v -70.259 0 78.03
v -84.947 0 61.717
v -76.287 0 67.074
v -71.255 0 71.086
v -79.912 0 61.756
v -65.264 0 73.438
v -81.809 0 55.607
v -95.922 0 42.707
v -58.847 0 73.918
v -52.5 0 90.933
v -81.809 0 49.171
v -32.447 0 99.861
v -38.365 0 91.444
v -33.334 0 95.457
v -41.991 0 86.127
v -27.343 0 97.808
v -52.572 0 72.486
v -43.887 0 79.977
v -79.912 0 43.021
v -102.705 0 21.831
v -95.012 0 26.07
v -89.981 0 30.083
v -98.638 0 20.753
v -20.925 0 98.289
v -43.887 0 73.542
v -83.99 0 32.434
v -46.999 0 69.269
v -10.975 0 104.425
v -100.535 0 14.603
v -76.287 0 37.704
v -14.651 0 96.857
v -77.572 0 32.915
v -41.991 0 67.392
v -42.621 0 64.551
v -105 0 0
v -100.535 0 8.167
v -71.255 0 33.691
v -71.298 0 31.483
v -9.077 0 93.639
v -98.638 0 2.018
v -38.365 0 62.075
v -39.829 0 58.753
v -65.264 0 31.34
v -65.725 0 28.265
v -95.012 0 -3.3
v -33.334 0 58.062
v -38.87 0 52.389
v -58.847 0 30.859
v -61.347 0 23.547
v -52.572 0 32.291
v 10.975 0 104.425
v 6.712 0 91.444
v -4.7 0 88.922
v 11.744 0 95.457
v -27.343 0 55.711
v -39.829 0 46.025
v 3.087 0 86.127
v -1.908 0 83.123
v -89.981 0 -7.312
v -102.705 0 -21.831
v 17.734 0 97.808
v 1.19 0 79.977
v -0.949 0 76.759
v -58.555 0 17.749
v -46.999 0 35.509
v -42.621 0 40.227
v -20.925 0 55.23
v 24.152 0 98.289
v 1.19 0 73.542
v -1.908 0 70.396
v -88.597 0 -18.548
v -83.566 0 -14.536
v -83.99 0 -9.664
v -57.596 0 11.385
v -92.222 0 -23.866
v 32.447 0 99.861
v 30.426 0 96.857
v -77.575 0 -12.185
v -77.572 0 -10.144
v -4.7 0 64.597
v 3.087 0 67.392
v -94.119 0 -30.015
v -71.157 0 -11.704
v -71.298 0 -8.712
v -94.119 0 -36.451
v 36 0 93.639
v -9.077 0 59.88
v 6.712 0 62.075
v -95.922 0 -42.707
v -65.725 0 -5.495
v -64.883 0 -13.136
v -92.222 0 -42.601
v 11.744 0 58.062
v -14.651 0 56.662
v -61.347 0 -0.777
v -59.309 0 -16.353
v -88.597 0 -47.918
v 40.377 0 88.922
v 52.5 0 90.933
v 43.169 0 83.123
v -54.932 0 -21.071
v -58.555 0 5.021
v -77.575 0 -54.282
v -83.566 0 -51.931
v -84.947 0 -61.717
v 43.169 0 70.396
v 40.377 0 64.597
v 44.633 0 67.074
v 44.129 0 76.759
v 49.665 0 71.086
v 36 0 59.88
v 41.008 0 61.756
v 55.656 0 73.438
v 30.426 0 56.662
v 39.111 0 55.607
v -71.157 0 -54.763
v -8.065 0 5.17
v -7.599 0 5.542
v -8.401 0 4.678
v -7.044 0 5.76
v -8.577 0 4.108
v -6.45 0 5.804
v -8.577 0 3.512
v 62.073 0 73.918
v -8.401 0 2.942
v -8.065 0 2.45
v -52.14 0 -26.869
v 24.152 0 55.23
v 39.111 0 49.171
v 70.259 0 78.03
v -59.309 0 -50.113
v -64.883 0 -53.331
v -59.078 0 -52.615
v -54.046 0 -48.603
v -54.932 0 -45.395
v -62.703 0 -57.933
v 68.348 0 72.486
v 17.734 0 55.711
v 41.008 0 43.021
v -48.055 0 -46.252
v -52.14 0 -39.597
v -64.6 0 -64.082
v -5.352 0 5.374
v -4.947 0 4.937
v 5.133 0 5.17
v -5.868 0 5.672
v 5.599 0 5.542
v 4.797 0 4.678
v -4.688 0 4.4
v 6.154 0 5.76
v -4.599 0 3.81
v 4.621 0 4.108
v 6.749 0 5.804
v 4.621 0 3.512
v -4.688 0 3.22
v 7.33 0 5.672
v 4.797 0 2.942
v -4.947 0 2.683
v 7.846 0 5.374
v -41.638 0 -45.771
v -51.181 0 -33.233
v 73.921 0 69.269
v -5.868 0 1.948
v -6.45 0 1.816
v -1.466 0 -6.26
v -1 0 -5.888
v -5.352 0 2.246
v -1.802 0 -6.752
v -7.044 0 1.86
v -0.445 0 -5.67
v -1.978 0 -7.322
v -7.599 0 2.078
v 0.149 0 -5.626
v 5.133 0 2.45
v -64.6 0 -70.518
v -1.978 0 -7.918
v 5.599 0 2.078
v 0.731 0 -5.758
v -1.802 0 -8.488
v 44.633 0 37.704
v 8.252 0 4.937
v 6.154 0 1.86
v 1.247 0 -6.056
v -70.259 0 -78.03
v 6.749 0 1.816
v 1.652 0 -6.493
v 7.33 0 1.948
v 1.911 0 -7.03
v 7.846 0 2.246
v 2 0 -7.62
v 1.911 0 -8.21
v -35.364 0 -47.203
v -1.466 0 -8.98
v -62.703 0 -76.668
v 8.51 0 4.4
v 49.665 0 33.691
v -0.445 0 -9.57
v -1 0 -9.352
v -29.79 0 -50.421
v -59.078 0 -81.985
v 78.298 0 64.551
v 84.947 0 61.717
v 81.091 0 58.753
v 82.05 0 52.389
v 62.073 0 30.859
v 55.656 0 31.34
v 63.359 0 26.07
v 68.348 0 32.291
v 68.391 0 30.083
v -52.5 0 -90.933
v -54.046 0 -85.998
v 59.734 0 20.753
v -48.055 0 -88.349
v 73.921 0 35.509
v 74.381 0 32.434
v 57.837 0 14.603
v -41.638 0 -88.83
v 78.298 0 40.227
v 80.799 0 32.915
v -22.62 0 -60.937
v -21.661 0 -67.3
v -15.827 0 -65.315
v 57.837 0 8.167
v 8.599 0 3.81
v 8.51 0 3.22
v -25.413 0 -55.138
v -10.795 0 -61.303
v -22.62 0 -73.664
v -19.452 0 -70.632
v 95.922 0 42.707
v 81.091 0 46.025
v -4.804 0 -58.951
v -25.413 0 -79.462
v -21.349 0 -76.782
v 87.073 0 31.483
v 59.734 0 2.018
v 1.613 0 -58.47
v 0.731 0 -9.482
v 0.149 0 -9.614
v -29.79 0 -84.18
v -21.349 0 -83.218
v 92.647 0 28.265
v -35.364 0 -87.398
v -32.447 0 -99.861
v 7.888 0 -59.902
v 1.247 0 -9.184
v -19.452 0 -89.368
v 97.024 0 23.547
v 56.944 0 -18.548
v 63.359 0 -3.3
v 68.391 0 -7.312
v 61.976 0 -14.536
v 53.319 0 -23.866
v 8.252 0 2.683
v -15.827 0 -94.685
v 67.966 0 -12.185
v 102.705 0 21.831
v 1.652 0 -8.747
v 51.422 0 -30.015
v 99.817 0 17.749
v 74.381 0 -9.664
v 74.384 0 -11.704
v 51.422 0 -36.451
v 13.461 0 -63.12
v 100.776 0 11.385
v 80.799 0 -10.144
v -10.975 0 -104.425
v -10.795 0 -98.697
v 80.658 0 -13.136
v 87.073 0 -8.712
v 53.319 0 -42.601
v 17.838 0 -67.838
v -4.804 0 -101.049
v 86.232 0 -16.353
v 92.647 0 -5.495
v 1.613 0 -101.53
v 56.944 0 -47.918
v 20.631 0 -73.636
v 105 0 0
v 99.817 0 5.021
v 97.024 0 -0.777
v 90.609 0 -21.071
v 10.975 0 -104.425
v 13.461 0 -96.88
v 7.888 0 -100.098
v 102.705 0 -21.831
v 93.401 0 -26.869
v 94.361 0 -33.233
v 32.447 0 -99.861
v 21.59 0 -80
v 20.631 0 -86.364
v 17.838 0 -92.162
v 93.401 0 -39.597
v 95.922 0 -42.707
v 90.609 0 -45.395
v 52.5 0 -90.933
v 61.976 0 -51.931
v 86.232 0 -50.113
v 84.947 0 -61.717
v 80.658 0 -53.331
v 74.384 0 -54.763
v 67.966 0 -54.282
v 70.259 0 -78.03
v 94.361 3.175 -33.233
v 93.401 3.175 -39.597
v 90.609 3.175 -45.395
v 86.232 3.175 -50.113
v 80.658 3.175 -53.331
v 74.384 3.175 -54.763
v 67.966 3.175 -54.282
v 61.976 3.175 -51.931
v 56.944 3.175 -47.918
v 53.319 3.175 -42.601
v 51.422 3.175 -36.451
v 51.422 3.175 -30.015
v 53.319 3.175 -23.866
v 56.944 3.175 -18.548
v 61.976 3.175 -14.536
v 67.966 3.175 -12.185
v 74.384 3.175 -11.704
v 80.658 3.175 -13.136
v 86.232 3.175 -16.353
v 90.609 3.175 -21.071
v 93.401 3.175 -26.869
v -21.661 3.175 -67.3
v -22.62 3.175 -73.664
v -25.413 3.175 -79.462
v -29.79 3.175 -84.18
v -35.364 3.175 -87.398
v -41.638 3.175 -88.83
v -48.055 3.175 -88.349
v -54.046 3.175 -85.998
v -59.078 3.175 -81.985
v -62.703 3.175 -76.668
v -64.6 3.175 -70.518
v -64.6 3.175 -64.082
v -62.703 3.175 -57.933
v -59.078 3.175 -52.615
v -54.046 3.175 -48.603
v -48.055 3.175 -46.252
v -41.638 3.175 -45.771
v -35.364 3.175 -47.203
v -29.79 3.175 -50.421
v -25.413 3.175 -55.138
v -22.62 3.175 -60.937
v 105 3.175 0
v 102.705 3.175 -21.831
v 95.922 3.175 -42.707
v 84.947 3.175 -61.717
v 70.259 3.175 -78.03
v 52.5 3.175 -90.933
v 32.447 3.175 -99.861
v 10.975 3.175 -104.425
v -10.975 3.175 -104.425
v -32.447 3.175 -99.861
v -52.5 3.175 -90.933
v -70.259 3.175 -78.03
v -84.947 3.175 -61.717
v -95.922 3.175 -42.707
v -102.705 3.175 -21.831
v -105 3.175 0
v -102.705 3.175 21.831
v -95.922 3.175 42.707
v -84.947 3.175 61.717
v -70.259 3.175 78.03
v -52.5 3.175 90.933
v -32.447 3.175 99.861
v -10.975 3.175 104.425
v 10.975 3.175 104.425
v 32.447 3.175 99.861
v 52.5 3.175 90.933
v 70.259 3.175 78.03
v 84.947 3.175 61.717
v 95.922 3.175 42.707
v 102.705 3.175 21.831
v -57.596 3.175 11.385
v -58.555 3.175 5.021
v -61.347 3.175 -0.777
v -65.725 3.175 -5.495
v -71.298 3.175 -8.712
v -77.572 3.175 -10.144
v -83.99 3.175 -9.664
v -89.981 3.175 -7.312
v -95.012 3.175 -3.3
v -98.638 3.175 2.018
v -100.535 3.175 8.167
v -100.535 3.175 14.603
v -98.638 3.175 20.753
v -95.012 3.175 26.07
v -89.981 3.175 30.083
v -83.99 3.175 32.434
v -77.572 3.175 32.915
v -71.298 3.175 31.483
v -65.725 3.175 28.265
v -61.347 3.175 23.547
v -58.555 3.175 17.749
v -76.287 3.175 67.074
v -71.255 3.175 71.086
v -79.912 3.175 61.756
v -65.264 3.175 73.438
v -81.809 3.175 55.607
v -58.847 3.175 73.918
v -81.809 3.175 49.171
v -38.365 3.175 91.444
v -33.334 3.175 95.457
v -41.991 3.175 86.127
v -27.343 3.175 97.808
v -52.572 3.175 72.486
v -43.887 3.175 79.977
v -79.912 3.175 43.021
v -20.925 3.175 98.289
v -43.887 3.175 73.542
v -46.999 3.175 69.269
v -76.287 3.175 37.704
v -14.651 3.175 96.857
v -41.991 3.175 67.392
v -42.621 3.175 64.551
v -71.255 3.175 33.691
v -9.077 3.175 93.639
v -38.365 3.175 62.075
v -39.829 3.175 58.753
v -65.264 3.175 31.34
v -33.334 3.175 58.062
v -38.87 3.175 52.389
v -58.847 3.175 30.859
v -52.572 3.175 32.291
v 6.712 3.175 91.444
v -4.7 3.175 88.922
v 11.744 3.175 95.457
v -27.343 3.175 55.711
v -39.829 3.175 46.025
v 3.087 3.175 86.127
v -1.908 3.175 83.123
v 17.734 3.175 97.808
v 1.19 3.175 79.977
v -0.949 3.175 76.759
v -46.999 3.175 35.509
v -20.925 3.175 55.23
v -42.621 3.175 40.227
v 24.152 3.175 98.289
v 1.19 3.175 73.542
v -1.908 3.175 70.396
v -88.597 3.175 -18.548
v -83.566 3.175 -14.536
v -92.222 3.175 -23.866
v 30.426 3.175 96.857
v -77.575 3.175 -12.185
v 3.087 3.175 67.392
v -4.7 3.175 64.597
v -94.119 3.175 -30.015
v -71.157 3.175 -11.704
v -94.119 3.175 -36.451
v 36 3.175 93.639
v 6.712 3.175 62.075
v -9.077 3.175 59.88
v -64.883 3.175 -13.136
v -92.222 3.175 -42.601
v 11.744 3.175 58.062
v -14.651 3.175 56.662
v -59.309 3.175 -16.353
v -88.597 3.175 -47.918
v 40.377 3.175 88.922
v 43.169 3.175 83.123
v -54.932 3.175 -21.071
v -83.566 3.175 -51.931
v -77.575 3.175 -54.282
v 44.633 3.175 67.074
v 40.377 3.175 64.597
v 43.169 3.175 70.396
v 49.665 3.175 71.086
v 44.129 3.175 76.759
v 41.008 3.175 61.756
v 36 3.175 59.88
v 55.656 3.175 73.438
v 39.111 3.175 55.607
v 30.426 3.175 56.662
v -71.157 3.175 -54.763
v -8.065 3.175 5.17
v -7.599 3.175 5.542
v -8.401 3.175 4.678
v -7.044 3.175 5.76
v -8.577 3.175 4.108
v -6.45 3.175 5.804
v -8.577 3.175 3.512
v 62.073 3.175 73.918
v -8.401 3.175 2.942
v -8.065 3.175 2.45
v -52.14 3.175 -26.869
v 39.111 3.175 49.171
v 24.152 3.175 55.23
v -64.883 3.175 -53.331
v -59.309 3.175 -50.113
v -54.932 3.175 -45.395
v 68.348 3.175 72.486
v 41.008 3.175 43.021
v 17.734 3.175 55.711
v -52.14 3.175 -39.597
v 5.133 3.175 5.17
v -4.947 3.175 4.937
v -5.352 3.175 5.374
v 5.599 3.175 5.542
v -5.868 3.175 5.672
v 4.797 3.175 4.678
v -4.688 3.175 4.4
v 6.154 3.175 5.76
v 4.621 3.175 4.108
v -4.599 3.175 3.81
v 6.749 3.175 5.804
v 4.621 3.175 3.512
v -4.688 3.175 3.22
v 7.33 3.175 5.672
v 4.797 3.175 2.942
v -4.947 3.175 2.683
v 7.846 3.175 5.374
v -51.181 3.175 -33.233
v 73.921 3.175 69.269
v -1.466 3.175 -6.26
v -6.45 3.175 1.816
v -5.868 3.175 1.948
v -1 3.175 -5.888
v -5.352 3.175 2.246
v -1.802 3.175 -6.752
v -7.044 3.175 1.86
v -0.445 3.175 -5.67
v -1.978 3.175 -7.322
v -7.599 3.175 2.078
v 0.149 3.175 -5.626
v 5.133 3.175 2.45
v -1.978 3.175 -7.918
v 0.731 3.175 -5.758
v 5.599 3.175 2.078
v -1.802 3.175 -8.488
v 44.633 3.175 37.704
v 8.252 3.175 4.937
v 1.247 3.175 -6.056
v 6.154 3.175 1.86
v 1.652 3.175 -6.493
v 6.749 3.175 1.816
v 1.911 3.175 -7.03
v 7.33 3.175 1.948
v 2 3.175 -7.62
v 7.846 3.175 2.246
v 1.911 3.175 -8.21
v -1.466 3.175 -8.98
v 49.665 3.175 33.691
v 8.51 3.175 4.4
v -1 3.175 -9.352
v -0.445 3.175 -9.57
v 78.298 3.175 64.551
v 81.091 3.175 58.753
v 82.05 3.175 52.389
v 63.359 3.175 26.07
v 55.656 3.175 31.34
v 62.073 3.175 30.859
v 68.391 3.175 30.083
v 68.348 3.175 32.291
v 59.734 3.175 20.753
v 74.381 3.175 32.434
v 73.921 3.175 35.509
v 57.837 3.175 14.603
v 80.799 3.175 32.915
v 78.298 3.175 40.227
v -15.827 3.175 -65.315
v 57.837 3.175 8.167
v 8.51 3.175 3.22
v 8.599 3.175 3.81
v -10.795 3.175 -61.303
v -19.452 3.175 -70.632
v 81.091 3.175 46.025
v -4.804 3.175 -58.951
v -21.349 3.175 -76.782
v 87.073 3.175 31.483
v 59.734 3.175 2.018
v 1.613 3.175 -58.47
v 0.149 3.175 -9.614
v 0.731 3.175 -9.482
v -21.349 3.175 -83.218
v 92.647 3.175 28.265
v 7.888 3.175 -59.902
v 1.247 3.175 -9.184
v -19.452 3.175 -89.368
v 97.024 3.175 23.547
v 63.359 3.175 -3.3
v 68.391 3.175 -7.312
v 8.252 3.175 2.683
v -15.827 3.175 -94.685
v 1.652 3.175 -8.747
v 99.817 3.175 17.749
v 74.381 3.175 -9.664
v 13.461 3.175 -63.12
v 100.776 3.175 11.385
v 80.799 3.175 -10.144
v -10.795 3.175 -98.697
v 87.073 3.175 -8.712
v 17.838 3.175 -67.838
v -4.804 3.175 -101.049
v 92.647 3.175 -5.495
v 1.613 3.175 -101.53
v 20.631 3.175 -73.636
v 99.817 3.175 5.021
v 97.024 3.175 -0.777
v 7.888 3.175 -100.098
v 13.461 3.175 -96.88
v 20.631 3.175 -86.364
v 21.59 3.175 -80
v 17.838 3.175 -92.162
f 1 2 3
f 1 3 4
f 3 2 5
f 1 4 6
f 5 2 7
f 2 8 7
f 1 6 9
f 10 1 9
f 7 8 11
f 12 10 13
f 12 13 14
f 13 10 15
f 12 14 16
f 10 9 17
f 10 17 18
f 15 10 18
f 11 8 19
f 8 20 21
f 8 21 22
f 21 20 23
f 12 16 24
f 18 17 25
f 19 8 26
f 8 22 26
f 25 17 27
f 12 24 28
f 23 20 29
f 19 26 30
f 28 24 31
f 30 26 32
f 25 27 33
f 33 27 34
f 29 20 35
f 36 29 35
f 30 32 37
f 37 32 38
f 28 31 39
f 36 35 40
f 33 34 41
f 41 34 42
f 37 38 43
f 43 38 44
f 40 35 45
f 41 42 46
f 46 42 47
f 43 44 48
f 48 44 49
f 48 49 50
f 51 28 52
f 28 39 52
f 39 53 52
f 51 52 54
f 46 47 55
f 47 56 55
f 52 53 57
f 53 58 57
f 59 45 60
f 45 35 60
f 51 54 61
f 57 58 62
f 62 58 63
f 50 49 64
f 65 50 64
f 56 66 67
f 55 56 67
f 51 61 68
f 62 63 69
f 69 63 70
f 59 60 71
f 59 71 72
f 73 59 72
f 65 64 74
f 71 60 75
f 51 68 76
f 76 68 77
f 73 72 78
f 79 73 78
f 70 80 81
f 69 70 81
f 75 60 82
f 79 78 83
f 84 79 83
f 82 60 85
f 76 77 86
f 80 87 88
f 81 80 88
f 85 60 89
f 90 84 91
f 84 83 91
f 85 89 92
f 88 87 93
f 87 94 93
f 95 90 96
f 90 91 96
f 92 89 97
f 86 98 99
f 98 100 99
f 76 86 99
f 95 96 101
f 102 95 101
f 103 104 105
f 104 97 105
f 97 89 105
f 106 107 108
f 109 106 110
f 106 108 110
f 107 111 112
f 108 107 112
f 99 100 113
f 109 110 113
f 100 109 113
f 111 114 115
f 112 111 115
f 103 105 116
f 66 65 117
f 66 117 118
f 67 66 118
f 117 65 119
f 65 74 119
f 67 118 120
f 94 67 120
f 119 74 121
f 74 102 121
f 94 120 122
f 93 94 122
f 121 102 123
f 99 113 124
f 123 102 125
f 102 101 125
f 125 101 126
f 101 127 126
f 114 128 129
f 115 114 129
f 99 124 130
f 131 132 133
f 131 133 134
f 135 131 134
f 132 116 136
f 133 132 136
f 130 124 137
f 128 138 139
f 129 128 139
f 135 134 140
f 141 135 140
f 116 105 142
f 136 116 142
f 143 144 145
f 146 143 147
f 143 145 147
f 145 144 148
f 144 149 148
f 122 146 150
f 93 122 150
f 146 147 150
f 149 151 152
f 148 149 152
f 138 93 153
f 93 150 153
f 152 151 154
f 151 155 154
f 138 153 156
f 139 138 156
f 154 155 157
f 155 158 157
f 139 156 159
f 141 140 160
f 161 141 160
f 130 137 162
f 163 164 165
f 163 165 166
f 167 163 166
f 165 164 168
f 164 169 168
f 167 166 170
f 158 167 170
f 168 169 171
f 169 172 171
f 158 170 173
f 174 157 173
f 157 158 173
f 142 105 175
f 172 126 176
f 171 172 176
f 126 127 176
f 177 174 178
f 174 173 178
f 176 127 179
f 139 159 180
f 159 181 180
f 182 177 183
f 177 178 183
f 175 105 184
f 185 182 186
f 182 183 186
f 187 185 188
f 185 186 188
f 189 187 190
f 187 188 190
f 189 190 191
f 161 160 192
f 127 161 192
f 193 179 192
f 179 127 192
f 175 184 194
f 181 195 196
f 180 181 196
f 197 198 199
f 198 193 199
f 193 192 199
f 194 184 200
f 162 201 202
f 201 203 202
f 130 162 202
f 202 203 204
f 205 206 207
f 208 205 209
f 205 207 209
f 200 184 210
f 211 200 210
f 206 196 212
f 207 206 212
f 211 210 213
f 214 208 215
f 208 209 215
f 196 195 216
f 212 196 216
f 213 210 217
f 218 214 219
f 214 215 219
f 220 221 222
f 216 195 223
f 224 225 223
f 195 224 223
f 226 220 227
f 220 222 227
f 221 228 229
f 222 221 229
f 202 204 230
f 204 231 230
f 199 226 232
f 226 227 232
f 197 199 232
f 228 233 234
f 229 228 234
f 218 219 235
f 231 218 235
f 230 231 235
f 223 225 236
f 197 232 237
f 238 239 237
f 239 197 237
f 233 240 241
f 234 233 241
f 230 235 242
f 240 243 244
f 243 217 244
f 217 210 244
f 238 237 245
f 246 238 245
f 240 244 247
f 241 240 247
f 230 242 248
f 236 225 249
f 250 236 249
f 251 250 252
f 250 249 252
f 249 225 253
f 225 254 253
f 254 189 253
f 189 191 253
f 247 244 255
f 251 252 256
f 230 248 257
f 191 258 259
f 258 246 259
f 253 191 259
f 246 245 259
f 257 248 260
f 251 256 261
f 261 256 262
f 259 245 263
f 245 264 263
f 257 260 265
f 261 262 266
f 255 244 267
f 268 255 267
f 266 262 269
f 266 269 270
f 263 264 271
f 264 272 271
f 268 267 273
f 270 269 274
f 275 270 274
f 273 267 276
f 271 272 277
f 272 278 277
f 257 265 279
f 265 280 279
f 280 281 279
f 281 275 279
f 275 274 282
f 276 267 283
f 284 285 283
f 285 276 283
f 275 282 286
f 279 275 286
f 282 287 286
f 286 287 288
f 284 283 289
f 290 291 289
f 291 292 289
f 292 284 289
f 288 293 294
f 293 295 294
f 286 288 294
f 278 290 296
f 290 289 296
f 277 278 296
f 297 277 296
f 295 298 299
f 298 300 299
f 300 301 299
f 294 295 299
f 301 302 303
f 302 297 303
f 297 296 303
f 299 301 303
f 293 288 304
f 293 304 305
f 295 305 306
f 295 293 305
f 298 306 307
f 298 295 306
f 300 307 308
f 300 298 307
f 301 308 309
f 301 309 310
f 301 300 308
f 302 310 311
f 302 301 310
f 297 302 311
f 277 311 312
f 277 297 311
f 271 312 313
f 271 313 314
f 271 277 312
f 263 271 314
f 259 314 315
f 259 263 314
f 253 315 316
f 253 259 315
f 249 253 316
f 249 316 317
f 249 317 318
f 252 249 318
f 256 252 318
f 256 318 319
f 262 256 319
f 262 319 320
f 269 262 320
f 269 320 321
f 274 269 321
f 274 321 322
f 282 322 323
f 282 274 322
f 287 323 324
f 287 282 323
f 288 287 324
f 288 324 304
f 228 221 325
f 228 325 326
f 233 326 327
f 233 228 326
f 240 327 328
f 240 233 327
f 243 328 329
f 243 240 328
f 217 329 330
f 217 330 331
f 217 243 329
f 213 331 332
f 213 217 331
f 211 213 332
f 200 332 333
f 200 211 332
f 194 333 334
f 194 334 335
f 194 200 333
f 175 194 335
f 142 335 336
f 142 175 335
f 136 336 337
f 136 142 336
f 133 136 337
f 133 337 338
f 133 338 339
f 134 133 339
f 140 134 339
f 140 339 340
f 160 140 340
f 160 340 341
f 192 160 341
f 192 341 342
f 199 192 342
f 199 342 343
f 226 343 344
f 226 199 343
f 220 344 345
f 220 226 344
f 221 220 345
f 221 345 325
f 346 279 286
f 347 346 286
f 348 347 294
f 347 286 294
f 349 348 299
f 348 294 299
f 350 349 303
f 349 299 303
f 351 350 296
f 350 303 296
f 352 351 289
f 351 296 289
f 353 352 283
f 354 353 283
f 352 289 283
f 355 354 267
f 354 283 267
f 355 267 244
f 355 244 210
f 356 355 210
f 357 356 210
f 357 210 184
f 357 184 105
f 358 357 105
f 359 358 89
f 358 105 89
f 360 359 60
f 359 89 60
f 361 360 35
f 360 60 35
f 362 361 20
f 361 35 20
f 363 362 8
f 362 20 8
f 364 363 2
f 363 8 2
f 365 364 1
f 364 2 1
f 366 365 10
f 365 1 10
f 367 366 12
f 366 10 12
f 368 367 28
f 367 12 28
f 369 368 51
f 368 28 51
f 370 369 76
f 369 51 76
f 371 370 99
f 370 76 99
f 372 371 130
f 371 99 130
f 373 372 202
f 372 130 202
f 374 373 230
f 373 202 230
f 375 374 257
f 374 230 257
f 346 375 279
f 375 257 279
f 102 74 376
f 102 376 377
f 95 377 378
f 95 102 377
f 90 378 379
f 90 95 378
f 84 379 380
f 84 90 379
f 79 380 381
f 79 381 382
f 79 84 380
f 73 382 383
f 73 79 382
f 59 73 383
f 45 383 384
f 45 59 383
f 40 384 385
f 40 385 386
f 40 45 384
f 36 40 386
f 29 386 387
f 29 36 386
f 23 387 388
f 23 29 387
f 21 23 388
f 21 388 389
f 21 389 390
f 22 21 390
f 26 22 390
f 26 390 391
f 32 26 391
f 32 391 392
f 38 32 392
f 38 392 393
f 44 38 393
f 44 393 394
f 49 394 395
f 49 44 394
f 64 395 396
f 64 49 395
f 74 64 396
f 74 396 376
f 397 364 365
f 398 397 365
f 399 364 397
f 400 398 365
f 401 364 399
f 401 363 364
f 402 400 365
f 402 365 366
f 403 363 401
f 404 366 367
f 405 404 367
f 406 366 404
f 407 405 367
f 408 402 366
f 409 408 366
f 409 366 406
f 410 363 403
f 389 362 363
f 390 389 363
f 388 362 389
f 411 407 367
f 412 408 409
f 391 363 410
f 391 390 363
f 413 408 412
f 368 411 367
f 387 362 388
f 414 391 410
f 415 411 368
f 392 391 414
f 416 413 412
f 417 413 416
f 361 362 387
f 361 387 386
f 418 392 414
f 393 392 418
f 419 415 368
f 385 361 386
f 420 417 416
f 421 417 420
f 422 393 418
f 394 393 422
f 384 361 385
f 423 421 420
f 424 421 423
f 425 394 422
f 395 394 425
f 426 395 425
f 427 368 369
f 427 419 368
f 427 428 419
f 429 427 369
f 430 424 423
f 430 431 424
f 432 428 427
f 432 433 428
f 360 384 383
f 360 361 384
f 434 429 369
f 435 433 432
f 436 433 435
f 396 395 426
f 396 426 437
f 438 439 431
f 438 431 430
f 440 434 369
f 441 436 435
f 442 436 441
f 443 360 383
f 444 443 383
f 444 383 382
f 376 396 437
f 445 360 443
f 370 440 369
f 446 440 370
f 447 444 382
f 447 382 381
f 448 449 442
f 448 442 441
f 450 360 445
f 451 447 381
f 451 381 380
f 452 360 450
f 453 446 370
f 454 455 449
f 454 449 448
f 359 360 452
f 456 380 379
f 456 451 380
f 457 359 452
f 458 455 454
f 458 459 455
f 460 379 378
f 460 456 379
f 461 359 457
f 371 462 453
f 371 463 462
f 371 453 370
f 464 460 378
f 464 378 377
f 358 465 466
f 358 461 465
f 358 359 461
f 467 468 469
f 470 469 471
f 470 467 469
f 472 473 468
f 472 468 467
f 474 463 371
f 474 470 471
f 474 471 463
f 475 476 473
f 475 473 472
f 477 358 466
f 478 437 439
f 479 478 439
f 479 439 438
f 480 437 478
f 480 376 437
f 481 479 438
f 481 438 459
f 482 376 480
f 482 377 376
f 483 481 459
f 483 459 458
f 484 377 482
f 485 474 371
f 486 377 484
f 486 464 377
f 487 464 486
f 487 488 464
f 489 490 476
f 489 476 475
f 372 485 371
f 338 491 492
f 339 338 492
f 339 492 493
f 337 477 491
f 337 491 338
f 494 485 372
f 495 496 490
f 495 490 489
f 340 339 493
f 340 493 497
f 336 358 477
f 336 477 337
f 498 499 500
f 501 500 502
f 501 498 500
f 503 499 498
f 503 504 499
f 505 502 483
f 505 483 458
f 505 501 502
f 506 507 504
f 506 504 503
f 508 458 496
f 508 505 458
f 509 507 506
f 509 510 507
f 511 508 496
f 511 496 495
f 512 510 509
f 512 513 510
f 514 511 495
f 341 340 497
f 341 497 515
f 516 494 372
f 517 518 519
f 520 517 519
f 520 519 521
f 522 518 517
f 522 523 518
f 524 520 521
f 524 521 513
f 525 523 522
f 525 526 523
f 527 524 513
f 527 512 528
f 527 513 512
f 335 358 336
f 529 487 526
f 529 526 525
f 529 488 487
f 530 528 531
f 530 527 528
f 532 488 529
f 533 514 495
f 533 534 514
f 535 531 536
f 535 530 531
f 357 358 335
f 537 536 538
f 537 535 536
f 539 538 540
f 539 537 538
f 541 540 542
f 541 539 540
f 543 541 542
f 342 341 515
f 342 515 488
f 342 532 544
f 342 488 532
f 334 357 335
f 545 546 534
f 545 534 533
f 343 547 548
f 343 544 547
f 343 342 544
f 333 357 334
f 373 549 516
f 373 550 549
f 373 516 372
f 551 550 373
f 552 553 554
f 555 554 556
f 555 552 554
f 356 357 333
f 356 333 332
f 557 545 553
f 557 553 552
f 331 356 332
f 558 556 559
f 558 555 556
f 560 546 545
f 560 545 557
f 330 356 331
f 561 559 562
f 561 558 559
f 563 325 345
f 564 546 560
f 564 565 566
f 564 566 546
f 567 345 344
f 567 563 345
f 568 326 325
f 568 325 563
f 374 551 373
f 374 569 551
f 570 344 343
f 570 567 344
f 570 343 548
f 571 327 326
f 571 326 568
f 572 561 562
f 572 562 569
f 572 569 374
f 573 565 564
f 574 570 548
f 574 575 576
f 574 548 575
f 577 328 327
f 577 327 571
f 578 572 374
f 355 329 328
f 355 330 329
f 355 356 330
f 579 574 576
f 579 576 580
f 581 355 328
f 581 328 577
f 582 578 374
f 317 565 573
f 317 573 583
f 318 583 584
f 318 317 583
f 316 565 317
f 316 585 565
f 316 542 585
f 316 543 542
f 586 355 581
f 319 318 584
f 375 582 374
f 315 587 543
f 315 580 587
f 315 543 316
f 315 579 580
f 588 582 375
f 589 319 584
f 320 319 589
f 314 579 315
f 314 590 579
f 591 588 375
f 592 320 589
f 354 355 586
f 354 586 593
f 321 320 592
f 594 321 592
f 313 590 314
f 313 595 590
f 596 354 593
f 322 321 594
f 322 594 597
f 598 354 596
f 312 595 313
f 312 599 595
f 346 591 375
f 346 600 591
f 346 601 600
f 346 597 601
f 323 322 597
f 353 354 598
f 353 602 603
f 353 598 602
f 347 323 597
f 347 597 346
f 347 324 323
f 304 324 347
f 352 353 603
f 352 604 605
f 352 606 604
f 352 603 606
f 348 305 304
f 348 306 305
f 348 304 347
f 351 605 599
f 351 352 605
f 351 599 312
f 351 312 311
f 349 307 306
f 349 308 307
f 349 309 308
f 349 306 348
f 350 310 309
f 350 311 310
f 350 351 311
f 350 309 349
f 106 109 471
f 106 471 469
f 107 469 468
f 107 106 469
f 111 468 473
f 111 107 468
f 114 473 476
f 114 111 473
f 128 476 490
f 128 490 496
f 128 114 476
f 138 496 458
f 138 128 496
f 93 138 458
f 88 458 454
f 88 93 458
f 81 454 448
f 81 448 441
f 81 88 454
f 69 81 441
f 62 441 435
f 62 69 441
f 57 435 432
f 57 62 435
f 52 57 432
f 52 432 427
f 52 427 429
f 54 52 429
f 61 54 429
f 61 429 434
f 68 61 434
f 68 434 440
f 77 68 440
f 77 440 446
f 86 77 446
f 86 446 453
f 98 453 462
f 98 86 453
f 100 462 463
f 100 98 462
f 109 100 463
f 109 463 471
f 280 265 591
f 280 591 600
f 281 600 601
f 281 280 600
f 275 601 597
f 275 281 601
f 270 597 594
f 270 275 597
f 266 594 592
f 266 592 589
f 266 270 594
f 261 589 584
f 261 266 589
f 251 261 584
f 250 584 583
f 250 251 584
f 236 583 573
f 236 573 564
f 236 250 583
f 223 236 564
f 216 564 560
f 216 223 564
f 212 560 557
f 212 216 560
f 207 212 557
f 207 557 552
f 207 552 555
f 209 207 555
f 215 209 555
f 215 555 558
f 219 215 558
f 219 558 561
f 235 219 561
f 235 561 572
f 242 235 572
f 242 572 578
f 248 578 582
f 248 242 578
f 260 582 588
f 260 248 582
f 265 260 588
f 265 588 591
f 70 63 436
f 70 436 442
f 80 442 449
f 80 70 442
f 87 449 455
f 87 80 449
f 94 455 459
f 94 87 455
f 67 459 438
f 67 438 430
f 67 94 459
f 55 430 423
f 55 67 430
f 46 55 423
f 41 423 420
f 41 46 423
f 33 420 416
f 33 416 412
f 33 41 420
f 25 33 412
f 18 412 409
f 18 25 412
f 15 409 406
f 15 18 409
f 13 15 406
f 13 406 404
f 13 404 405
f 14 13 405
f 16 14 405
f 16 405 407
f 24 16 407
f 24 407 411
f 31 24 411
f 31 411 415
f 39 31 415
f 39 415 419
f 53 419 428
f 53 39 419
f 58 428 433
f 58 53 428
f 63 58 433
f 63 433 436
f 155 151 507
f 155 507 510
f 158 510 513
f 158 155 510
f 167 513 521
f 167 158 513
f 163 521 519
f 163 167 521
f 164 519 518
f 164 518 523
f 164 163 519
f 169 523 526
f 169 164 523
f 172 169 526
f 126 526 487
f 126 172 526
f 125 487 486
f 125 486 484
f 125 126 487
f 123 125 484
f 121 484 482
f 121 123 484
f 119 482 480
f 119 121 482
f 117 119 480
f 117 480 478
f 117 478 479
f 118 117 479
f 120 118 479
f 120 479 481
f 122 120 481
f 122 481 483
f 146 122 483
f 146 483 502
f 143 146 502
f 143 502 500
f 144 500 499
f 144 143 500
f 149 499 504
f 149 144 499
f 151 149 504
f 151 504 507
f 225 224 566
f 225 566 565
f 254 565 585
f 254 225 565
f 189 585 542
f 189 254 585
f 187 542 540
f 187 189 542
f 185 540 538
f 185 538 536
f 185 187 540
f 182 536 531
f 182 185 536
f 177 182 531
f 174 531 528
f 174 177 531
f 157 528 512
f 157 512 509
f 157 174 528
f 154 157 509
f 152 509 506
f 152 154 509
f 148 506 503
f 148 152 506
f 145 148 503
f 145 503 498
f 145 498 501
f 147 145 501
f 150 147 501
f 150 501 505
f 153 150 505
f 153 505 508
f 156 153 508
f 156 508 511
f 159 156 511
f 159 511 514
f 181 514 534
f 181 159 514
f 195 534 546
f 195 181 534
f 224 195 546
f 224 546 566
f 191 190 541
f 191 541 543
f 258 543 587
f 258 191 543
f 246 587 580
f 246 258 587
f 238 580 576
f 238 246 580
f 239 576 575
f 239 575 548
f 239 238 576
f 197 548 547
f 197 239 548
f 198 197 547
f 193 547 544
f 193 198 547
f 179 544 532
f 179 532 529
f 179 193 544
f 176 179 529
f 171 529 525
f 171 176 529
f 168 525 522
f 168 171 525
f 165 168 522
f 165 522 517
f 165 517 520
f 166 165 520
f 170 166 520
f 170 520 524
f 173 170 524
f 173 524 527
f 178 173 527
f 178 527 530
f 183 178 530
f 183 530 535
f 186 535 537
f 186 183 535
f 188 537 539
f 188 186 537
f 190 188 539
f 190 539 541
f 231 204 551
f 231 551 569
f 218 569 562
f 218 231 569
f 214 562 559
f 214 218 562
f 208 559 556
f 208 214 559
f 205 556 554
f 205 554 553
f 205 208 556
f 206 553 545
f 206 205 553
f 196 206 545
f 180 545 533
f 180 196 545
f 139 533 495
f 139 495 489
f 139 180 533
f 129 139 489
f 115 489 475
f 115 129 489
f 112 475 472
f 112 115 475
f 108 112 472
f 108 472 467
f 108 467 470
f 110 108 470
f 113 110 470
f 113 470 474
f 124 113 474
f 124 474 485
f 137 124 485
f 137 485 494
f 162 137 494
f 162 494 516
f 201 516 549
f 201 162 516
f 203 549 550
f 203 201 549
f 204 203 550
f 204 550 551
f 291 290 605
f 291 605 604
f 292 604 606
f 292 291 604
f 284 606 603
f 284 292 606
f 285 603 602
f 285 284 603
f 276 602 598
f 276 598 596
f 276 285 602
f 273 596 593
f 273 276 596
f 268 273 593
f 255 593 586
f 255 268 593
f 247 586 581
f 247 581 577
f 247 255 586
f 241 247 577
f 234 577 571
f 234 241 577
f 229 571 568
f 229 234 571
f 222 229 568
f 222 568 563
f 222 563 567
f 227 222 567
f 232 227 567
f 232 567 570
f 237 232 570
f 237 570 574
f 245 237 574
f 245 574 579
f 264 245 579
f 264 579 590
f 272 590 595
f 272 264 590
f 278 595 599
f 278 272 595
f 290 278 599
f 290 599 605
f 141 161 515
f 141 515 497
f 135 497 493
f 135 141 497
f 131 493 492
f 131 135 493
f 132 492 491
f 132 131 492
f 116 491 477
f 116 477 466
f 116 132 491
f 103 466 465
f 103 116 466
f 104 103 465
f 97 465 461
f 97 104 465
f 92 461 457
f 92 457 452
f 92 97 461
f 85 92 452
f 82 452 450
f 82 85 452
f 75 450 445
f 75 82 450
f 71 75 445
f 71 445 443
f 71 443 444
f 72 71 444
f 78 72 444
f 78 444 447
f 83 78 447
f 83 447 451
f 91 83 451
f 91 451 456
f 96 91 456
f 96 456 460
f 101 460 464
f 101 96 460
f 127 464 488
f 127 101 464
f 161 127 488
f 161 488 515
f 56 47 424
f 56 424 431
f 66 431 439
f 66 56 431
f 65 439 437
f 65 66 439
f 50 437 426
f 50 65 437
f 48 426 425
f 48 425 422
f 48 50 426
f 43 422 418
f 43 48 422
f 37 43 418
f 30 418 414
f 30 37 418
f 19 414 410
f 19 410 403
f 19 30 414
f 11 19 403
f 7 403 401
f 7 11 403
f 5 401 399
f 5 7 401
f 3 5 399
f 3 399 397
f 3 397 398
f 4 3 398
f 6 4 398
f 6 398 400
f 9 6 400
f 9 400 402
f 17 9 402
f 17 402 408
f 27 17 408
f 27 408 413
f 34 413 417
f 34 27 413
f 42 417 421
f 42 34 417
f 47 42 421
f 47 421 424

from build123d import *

# Parameters (mm, degrees)
SKETCH2_R           = 105
SKETCH2_R_2         = 21.59
SKETCH2_R_3         = 2
BOSS_EXTRUDE2_DEPTH = 3.175


with BuildPart() as part:
    # Sketch2 → Boss-Extrude2 (new body)
    with BuildSketch(Plane(origin=(0, 0, 0), x_dir=(1, 0, 0), z_dir=(0, 1, 0))):
        Circle(SKETCH2_R)
        with Locations((0, 80)):
            Circle(SKETCH2_R_2, mode=Mode.SUBTRACT)
        with Locations((72.770559628, 33.23320104)):
            Circle(SKETCH2_R_2, mode=Mode.SUBTRACT)
        with Locations((79.18571535, -11.385187062)):
            Circle(SKETCH2_R_2, mode=Mode.SUBTRACT)
        with Locations((60.459965948, -52.388858716)):
            Circle(SKETCH2_R_2, mode=Mode.SUBTRACT)
        with Locations((22.538604547, -76.759437889)):
            Circle(SKETCH2_R_2, mode=Mode.SUBTRACT)
        with Locations((-22.538604547, -76.759437889)):
            Circle(SKETCH2_R_2, mode=Mode.SUBTRACT)
        with Locations((-60.459965948, -52.388858716)):
            Circle(SKETCH2_R_2, mode=Mode.SUBTRACT)
        with Locations((-79.18571535, -11.385187062)):
            Circle(SKETCH2_R_2, mode=Mode.SUBTRACT)
        with Locations((-72.770559628, 33.23320104)):
            Circle(SKETCH2_R_2, mode=Mode.SUBTRACT)
        with Locations((-43.251265396, 67.300282626)):
            Circle(SKETCH2_R_2, mode=Mode.SUBTRACT)
        with Locations((0, 7.62)):
            Circle(SKETCH2_R_3, mode=Mode.SUBTRACT)
        with Locations((6.599113577, -3.81)):
            Circle(SKETCH2_R_3, mode=Mode.SUBTRACT)
        with Locations((-6.599113577, -3.81)):
            Circle(SKETCH2_R_3, mode=Mode.SUBTRACT)
    extrude(amount=BOSS_EXTRUDE2_DEPTH)


solid = part.part
